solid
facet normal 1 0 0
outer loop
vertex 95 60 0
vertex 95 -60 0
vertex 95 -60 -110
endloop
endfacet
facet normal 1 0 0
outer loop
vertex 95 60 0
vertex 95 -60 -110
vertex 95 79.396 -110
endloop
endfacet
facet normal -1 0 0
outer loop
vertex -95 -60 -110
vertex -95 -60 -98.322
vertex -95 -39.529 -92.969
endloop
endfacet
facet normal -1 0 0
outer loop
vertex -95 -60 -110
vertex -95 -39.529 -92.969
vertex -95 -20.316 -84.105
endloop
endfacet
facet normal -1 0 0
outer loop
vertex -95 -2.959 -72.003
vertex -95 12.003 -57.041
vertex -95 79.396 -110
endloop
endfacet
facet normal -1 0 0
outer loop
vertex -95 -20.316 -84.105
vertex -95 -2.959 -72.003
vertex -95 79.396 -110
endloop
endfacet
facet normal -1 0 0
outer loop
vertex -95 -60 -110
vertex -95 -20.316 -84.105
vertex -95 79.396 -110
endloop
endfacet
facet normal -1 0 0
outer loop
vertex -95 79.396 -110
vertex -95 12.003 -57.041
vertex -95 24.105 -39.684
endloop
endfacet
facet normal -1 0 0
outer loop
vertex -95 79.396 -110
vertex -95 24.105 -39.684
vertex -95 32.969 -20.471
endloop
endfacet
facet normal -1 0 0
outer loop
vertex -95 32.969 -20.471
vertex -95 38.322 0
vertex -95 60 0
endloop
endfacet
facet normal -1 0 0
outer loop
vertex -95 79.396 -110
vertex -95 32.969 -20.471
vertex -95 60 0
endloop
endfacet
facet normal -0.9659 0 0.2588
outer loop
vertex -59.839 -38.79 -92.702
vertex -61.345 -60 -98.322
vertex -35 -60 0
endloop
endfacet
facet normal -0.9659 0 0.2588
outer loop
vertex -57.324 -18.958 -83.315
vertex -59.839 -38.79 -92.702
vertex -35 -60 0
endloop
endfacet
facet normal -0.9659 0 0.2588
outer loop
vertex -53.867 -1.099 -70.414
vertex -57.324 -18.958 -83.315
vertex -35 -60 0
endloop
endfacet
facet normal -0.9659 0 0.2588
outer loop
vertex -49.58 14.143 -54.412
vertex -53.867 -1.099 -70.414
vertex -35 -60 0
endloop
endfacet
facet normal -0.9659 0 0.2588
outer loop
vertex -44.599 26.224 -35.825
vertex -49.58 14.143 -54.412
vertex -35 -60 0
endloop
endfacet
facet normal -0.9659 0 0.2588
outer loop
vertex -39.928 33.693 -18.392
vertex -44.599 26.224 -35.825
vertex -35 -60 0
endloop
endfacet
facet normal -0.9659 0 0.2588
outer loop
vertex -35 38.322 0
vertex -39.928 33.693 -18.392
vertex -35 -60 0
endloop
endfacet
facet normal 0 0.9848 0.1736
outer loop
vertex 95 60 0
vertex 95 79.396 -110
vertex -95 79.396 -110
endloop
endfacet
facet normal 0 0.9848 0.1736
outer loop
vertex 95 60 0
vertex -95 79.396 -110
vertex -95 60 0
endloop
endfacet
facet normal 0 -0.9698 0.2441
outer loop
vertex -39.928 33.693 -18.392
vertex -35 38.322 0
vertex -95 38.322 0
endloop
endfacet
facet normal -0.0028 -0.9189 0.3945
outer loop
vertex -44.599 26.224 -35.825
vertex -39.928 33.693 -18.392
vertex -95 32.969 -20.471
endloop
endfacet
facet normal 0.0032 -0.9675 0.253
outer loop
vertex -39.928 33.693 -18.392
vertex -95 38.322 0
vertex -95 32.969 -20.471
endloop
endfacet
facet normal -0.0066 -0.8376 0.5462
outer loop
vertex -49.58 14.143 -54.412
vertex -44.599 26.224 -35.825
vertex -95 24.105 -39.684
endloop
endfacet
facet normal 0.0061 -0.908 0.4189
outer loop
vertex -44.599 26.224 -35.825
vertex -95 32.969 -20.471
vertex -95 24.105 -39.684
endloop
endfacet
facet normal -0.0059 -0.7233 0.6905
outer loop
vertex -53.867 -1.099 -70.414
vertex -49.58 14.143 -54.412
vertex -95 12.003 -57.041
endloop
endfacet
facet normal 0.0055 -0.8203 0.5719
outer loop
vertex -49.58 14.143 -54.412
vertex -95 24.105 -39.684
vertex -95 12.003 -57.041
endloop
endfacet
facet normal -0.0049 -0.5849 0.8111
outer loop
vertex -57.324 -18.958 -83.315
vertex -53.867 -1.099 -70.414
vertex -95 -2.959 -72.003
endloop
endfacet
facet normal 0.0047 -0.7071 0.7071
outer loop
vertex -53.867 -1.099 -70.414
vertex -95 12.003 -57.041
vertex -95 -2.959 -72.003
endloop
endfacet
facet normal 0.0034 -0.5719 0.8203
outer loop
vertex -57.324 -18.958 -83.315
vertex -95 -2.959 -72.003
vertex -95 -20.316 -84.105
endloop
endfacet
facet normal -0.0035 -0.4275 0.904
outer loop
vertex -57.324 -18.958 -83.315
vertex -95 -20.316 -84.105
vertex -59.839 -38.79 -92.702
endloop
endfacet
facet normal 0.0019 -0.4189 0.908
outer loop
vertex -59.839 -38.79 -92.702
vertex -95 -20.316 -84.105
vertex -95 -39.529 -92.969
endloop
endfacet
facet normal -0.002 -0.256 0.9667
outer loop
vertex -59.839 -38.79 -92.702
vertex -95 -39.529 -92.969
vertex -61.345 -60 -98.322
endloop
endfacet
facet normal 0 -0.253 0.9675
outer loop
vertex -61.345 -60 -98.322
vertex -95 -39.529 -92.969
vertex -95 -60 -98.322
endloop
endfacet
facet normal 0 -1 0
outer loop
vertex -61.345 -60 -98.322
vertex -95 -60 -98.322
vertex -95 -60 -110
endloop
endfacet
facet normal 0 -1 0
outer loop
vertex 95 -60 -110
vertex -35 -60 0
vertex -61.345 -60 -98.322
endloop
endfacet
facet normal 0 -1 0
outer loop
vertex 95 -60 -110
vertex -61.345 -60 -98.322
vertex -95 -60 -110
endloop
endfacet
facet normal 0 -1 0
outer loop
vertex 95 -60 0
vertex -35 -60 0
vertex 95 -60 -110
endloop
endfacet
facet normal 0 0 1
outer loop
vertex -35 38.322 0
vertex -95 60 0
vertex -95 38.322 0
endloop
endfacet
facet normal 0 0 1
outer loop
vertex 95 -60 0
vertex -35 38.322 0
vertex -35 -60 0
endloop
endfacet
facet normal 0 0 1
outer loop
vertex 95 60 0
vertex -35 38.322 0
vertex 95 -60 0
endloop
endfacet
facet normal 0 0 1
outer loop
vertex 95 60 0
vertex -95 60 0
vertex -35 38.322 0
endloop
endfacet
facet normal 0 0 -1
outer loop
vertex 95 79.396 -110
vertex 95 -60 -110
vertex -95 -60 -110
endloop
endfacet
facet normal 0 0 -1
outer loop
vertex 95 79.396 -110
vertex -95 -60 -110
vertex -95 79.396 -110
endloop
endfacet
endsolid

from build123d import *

# Parameters (mm, degrees)
F0_W     = 190
F0_H     = 120
F1_DEPTH = 110
F3_DEPTH = 190
F7_REACH = 199.0477340594


with BuildPart() as f1:
    # F0 (on Top) → F1 (new body)
    with BuildSketch(Plane.XY):
        Rectangle(F0_W, F0_H)
    extrude(amount=-F1_DEPTH)

    # F2 (on face) → F3 (join, through all)
    with BuildSketch(Plane.YZ.offset(95)):
        Polygon((79.3959678779, -110), (60, 0), (60, -110), align=None)
    extrude(amount=-F3_DEPTH)

    f7_end = Plane(origin=(-32.6554445662, 0, 8.75), x_dir=(0.2588190451, 0, 0.9659258263), z_dir=(0.9659258263, 0, -0.2588190451))
    # F4 (on face) → F7 (cut, up to a plane its end follows)
    with BuildSketch(Plane(origin=(-95, 0, 0), x_dir=(0, -1, 0), z_dir=(-1, 0, 0))):
        with BuildLine():
            Line((60, -98.321595662), (60, 0))
            Line((60, 0), (-38.321595662, 0))
            ThreePointArc((-38.321595662, 0), (-4.8528137424, -64.8528137424), (60, -98.321595662))
        make_face()
    f7_long = extrude(amount=-F7_REACH, mode=Mode.PRIVATE)
    add(split(f7_long, bisect_by=f7_end, keep=Keep.BOTTOM, mode=Mode.PRIVATE), mode=Mode.SUBTRACT)


solid = f1.part
